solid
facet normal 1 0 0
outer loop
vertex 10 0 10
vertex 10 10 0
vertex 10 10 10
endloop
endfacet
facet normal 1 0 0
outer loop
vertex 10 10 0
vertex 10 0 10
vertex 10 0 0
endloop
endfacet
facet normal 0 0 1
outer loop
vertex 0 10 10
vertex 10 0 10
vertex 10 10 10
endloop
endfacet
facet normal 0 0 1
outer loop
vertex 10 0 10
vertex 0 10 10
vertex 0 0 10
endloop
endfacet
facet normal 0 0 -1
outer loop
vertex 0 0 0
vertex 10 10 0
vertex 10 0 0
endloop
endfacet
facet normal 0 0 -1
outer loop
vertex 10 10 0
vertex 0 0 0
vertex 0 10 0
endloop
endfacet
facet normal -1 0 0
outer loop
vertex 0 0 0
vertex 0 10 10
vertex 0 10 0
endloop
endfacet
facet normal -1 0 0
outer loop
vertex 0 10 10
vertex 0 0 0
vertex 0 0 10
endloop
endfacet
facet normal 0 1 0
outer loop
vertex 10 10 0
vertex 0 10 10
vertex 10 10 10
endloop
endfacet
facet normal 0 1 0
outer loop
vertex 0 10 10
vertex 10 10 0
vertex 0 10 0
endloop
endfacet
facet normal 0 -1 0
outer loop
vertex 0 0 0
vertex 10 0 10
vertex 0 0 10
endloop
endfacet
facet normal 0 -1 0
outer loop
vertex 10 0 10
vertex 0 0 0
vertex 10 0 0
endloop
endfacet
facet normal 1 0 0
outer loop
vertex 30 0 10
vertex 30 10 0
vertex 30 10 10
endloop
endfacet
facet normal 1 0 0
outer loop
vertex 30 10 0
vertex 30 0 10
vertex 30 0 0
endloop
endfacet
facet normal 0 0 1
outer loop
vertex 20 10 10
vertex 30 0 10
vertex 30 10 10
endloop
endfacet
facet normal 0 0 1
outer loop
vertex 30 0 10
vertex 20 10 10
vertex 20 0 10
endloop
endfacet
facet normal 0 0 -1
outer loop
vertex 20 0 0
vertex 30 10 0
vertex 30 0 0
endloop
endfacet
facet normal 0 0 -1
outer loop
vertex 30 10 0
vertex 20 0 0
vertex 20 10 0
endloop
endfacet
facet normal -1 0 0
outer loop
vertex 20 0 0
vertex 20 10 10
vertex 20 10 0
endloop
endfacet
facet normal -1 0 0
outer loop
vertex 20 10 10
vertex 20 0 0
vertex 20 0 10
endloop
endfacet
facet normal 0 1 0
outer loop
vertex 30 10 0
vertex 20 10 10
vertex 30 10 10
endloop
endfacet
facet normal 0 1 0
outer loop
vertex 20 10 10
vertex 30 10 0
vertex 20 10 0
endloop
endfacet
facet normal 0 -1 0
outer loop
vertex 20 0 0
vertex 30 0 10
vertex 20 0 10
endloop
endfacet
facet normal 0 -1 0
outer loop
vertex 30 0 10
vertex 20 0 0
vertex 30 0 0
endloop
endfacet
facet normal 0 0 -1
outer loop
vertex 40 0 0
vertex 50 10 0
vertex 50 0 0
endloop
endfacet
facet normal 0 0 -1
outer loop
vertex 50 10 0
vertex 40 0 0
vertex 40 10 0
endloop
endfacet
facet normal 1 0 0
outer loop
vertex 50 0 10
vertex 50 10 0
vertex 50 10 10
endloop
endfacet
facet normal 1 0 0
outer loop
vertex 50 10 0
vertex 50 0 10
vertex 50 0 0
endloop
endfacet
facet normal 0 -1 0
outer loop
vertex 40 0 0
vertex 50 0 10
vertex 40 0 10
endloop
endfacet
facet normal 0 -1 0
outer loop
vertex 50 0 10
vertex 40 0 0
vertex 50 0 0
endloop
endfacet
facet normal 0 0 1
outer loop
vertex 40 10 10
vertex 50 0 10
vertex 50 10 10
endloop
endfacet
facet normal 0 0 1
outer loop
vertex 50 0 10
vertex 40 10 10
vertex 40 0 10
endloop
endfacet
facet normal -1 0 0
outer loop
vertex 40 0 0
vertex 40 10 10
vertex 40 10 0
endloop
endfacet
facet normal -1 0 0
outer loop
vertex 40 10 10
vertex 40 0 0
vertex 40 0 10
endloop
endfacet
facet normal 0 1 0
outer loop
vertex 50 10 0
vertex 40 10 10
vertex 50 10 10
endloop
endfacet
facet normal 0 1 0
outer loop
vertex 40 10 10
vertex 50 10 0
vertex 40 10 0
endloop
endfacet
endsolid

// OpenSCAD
// A face on a declared plane by position alone.
//
// Two cubes of side 10, twenty apart along x, declare eight planes between them:
// their tops, bottoms, fronts and backs coincide - z = 0 and 10, y = 0 and 10,
// one record each - and their ends are x = 0, 10, 20 and 30. A polyhedron()
// block of the same size at x = 40 declares nothing. Four of its faces lie on
// the cubes' planes anyway, z = 0 and 10 and y = 0 and 10; its ends, x = 40 and
// 50, lie on none.
//
// Position derives: such a face is written on the declared plane - the exact
// coefficients of the plane it lies on - at D1, and it is not the cube's face
// (checklist E8: nothing unnamed stands in for D0). Until 2026-09-30 the census
// counted it on a declared plane with the cubes' own faces, and it would have
// marked a declaration written for it alone (open item 39, R1). The cubes'
// twelve faces are on their planes by name; the block's four by position; its
// two ends on the planes of their own corners, which the census counts with
// the tessellation.
//
// EXPECT: 8 declared planes: 8 written as a face
// EXPECT: 12 on a declared plane, 4 on one by position alone, 0 on a surface the
// EXPECT: approximation fitted, 2 left to the tessellation
// EXPECT: 16 planar faces written on a plane the model declared
// EXPECT: 12 named for it, 4 on it by position alone
//
// Three cubes of side 10.
// VOLUME: 3000
// VOLUME-APPROX: 3000

cube(10);
translate([20, 0, 0]) cube(10);
translate([40, 0, 0])
  polyhedron(points = [[0, 0, 0], [10, 0, 0], [10, 10, 0], [0, 10, 0],
                       [0, 0, 10], [10, 0, 10], [10, 10, 10], [0, 10, 10]],
             faces = [[0, 1, 2, 3], [4, 5, 1, 0], [7, 6, 5, 4], [5, 6, 2, 1], [6, 7, 3, 2],
                      [7, 4, 0, 3]]);
